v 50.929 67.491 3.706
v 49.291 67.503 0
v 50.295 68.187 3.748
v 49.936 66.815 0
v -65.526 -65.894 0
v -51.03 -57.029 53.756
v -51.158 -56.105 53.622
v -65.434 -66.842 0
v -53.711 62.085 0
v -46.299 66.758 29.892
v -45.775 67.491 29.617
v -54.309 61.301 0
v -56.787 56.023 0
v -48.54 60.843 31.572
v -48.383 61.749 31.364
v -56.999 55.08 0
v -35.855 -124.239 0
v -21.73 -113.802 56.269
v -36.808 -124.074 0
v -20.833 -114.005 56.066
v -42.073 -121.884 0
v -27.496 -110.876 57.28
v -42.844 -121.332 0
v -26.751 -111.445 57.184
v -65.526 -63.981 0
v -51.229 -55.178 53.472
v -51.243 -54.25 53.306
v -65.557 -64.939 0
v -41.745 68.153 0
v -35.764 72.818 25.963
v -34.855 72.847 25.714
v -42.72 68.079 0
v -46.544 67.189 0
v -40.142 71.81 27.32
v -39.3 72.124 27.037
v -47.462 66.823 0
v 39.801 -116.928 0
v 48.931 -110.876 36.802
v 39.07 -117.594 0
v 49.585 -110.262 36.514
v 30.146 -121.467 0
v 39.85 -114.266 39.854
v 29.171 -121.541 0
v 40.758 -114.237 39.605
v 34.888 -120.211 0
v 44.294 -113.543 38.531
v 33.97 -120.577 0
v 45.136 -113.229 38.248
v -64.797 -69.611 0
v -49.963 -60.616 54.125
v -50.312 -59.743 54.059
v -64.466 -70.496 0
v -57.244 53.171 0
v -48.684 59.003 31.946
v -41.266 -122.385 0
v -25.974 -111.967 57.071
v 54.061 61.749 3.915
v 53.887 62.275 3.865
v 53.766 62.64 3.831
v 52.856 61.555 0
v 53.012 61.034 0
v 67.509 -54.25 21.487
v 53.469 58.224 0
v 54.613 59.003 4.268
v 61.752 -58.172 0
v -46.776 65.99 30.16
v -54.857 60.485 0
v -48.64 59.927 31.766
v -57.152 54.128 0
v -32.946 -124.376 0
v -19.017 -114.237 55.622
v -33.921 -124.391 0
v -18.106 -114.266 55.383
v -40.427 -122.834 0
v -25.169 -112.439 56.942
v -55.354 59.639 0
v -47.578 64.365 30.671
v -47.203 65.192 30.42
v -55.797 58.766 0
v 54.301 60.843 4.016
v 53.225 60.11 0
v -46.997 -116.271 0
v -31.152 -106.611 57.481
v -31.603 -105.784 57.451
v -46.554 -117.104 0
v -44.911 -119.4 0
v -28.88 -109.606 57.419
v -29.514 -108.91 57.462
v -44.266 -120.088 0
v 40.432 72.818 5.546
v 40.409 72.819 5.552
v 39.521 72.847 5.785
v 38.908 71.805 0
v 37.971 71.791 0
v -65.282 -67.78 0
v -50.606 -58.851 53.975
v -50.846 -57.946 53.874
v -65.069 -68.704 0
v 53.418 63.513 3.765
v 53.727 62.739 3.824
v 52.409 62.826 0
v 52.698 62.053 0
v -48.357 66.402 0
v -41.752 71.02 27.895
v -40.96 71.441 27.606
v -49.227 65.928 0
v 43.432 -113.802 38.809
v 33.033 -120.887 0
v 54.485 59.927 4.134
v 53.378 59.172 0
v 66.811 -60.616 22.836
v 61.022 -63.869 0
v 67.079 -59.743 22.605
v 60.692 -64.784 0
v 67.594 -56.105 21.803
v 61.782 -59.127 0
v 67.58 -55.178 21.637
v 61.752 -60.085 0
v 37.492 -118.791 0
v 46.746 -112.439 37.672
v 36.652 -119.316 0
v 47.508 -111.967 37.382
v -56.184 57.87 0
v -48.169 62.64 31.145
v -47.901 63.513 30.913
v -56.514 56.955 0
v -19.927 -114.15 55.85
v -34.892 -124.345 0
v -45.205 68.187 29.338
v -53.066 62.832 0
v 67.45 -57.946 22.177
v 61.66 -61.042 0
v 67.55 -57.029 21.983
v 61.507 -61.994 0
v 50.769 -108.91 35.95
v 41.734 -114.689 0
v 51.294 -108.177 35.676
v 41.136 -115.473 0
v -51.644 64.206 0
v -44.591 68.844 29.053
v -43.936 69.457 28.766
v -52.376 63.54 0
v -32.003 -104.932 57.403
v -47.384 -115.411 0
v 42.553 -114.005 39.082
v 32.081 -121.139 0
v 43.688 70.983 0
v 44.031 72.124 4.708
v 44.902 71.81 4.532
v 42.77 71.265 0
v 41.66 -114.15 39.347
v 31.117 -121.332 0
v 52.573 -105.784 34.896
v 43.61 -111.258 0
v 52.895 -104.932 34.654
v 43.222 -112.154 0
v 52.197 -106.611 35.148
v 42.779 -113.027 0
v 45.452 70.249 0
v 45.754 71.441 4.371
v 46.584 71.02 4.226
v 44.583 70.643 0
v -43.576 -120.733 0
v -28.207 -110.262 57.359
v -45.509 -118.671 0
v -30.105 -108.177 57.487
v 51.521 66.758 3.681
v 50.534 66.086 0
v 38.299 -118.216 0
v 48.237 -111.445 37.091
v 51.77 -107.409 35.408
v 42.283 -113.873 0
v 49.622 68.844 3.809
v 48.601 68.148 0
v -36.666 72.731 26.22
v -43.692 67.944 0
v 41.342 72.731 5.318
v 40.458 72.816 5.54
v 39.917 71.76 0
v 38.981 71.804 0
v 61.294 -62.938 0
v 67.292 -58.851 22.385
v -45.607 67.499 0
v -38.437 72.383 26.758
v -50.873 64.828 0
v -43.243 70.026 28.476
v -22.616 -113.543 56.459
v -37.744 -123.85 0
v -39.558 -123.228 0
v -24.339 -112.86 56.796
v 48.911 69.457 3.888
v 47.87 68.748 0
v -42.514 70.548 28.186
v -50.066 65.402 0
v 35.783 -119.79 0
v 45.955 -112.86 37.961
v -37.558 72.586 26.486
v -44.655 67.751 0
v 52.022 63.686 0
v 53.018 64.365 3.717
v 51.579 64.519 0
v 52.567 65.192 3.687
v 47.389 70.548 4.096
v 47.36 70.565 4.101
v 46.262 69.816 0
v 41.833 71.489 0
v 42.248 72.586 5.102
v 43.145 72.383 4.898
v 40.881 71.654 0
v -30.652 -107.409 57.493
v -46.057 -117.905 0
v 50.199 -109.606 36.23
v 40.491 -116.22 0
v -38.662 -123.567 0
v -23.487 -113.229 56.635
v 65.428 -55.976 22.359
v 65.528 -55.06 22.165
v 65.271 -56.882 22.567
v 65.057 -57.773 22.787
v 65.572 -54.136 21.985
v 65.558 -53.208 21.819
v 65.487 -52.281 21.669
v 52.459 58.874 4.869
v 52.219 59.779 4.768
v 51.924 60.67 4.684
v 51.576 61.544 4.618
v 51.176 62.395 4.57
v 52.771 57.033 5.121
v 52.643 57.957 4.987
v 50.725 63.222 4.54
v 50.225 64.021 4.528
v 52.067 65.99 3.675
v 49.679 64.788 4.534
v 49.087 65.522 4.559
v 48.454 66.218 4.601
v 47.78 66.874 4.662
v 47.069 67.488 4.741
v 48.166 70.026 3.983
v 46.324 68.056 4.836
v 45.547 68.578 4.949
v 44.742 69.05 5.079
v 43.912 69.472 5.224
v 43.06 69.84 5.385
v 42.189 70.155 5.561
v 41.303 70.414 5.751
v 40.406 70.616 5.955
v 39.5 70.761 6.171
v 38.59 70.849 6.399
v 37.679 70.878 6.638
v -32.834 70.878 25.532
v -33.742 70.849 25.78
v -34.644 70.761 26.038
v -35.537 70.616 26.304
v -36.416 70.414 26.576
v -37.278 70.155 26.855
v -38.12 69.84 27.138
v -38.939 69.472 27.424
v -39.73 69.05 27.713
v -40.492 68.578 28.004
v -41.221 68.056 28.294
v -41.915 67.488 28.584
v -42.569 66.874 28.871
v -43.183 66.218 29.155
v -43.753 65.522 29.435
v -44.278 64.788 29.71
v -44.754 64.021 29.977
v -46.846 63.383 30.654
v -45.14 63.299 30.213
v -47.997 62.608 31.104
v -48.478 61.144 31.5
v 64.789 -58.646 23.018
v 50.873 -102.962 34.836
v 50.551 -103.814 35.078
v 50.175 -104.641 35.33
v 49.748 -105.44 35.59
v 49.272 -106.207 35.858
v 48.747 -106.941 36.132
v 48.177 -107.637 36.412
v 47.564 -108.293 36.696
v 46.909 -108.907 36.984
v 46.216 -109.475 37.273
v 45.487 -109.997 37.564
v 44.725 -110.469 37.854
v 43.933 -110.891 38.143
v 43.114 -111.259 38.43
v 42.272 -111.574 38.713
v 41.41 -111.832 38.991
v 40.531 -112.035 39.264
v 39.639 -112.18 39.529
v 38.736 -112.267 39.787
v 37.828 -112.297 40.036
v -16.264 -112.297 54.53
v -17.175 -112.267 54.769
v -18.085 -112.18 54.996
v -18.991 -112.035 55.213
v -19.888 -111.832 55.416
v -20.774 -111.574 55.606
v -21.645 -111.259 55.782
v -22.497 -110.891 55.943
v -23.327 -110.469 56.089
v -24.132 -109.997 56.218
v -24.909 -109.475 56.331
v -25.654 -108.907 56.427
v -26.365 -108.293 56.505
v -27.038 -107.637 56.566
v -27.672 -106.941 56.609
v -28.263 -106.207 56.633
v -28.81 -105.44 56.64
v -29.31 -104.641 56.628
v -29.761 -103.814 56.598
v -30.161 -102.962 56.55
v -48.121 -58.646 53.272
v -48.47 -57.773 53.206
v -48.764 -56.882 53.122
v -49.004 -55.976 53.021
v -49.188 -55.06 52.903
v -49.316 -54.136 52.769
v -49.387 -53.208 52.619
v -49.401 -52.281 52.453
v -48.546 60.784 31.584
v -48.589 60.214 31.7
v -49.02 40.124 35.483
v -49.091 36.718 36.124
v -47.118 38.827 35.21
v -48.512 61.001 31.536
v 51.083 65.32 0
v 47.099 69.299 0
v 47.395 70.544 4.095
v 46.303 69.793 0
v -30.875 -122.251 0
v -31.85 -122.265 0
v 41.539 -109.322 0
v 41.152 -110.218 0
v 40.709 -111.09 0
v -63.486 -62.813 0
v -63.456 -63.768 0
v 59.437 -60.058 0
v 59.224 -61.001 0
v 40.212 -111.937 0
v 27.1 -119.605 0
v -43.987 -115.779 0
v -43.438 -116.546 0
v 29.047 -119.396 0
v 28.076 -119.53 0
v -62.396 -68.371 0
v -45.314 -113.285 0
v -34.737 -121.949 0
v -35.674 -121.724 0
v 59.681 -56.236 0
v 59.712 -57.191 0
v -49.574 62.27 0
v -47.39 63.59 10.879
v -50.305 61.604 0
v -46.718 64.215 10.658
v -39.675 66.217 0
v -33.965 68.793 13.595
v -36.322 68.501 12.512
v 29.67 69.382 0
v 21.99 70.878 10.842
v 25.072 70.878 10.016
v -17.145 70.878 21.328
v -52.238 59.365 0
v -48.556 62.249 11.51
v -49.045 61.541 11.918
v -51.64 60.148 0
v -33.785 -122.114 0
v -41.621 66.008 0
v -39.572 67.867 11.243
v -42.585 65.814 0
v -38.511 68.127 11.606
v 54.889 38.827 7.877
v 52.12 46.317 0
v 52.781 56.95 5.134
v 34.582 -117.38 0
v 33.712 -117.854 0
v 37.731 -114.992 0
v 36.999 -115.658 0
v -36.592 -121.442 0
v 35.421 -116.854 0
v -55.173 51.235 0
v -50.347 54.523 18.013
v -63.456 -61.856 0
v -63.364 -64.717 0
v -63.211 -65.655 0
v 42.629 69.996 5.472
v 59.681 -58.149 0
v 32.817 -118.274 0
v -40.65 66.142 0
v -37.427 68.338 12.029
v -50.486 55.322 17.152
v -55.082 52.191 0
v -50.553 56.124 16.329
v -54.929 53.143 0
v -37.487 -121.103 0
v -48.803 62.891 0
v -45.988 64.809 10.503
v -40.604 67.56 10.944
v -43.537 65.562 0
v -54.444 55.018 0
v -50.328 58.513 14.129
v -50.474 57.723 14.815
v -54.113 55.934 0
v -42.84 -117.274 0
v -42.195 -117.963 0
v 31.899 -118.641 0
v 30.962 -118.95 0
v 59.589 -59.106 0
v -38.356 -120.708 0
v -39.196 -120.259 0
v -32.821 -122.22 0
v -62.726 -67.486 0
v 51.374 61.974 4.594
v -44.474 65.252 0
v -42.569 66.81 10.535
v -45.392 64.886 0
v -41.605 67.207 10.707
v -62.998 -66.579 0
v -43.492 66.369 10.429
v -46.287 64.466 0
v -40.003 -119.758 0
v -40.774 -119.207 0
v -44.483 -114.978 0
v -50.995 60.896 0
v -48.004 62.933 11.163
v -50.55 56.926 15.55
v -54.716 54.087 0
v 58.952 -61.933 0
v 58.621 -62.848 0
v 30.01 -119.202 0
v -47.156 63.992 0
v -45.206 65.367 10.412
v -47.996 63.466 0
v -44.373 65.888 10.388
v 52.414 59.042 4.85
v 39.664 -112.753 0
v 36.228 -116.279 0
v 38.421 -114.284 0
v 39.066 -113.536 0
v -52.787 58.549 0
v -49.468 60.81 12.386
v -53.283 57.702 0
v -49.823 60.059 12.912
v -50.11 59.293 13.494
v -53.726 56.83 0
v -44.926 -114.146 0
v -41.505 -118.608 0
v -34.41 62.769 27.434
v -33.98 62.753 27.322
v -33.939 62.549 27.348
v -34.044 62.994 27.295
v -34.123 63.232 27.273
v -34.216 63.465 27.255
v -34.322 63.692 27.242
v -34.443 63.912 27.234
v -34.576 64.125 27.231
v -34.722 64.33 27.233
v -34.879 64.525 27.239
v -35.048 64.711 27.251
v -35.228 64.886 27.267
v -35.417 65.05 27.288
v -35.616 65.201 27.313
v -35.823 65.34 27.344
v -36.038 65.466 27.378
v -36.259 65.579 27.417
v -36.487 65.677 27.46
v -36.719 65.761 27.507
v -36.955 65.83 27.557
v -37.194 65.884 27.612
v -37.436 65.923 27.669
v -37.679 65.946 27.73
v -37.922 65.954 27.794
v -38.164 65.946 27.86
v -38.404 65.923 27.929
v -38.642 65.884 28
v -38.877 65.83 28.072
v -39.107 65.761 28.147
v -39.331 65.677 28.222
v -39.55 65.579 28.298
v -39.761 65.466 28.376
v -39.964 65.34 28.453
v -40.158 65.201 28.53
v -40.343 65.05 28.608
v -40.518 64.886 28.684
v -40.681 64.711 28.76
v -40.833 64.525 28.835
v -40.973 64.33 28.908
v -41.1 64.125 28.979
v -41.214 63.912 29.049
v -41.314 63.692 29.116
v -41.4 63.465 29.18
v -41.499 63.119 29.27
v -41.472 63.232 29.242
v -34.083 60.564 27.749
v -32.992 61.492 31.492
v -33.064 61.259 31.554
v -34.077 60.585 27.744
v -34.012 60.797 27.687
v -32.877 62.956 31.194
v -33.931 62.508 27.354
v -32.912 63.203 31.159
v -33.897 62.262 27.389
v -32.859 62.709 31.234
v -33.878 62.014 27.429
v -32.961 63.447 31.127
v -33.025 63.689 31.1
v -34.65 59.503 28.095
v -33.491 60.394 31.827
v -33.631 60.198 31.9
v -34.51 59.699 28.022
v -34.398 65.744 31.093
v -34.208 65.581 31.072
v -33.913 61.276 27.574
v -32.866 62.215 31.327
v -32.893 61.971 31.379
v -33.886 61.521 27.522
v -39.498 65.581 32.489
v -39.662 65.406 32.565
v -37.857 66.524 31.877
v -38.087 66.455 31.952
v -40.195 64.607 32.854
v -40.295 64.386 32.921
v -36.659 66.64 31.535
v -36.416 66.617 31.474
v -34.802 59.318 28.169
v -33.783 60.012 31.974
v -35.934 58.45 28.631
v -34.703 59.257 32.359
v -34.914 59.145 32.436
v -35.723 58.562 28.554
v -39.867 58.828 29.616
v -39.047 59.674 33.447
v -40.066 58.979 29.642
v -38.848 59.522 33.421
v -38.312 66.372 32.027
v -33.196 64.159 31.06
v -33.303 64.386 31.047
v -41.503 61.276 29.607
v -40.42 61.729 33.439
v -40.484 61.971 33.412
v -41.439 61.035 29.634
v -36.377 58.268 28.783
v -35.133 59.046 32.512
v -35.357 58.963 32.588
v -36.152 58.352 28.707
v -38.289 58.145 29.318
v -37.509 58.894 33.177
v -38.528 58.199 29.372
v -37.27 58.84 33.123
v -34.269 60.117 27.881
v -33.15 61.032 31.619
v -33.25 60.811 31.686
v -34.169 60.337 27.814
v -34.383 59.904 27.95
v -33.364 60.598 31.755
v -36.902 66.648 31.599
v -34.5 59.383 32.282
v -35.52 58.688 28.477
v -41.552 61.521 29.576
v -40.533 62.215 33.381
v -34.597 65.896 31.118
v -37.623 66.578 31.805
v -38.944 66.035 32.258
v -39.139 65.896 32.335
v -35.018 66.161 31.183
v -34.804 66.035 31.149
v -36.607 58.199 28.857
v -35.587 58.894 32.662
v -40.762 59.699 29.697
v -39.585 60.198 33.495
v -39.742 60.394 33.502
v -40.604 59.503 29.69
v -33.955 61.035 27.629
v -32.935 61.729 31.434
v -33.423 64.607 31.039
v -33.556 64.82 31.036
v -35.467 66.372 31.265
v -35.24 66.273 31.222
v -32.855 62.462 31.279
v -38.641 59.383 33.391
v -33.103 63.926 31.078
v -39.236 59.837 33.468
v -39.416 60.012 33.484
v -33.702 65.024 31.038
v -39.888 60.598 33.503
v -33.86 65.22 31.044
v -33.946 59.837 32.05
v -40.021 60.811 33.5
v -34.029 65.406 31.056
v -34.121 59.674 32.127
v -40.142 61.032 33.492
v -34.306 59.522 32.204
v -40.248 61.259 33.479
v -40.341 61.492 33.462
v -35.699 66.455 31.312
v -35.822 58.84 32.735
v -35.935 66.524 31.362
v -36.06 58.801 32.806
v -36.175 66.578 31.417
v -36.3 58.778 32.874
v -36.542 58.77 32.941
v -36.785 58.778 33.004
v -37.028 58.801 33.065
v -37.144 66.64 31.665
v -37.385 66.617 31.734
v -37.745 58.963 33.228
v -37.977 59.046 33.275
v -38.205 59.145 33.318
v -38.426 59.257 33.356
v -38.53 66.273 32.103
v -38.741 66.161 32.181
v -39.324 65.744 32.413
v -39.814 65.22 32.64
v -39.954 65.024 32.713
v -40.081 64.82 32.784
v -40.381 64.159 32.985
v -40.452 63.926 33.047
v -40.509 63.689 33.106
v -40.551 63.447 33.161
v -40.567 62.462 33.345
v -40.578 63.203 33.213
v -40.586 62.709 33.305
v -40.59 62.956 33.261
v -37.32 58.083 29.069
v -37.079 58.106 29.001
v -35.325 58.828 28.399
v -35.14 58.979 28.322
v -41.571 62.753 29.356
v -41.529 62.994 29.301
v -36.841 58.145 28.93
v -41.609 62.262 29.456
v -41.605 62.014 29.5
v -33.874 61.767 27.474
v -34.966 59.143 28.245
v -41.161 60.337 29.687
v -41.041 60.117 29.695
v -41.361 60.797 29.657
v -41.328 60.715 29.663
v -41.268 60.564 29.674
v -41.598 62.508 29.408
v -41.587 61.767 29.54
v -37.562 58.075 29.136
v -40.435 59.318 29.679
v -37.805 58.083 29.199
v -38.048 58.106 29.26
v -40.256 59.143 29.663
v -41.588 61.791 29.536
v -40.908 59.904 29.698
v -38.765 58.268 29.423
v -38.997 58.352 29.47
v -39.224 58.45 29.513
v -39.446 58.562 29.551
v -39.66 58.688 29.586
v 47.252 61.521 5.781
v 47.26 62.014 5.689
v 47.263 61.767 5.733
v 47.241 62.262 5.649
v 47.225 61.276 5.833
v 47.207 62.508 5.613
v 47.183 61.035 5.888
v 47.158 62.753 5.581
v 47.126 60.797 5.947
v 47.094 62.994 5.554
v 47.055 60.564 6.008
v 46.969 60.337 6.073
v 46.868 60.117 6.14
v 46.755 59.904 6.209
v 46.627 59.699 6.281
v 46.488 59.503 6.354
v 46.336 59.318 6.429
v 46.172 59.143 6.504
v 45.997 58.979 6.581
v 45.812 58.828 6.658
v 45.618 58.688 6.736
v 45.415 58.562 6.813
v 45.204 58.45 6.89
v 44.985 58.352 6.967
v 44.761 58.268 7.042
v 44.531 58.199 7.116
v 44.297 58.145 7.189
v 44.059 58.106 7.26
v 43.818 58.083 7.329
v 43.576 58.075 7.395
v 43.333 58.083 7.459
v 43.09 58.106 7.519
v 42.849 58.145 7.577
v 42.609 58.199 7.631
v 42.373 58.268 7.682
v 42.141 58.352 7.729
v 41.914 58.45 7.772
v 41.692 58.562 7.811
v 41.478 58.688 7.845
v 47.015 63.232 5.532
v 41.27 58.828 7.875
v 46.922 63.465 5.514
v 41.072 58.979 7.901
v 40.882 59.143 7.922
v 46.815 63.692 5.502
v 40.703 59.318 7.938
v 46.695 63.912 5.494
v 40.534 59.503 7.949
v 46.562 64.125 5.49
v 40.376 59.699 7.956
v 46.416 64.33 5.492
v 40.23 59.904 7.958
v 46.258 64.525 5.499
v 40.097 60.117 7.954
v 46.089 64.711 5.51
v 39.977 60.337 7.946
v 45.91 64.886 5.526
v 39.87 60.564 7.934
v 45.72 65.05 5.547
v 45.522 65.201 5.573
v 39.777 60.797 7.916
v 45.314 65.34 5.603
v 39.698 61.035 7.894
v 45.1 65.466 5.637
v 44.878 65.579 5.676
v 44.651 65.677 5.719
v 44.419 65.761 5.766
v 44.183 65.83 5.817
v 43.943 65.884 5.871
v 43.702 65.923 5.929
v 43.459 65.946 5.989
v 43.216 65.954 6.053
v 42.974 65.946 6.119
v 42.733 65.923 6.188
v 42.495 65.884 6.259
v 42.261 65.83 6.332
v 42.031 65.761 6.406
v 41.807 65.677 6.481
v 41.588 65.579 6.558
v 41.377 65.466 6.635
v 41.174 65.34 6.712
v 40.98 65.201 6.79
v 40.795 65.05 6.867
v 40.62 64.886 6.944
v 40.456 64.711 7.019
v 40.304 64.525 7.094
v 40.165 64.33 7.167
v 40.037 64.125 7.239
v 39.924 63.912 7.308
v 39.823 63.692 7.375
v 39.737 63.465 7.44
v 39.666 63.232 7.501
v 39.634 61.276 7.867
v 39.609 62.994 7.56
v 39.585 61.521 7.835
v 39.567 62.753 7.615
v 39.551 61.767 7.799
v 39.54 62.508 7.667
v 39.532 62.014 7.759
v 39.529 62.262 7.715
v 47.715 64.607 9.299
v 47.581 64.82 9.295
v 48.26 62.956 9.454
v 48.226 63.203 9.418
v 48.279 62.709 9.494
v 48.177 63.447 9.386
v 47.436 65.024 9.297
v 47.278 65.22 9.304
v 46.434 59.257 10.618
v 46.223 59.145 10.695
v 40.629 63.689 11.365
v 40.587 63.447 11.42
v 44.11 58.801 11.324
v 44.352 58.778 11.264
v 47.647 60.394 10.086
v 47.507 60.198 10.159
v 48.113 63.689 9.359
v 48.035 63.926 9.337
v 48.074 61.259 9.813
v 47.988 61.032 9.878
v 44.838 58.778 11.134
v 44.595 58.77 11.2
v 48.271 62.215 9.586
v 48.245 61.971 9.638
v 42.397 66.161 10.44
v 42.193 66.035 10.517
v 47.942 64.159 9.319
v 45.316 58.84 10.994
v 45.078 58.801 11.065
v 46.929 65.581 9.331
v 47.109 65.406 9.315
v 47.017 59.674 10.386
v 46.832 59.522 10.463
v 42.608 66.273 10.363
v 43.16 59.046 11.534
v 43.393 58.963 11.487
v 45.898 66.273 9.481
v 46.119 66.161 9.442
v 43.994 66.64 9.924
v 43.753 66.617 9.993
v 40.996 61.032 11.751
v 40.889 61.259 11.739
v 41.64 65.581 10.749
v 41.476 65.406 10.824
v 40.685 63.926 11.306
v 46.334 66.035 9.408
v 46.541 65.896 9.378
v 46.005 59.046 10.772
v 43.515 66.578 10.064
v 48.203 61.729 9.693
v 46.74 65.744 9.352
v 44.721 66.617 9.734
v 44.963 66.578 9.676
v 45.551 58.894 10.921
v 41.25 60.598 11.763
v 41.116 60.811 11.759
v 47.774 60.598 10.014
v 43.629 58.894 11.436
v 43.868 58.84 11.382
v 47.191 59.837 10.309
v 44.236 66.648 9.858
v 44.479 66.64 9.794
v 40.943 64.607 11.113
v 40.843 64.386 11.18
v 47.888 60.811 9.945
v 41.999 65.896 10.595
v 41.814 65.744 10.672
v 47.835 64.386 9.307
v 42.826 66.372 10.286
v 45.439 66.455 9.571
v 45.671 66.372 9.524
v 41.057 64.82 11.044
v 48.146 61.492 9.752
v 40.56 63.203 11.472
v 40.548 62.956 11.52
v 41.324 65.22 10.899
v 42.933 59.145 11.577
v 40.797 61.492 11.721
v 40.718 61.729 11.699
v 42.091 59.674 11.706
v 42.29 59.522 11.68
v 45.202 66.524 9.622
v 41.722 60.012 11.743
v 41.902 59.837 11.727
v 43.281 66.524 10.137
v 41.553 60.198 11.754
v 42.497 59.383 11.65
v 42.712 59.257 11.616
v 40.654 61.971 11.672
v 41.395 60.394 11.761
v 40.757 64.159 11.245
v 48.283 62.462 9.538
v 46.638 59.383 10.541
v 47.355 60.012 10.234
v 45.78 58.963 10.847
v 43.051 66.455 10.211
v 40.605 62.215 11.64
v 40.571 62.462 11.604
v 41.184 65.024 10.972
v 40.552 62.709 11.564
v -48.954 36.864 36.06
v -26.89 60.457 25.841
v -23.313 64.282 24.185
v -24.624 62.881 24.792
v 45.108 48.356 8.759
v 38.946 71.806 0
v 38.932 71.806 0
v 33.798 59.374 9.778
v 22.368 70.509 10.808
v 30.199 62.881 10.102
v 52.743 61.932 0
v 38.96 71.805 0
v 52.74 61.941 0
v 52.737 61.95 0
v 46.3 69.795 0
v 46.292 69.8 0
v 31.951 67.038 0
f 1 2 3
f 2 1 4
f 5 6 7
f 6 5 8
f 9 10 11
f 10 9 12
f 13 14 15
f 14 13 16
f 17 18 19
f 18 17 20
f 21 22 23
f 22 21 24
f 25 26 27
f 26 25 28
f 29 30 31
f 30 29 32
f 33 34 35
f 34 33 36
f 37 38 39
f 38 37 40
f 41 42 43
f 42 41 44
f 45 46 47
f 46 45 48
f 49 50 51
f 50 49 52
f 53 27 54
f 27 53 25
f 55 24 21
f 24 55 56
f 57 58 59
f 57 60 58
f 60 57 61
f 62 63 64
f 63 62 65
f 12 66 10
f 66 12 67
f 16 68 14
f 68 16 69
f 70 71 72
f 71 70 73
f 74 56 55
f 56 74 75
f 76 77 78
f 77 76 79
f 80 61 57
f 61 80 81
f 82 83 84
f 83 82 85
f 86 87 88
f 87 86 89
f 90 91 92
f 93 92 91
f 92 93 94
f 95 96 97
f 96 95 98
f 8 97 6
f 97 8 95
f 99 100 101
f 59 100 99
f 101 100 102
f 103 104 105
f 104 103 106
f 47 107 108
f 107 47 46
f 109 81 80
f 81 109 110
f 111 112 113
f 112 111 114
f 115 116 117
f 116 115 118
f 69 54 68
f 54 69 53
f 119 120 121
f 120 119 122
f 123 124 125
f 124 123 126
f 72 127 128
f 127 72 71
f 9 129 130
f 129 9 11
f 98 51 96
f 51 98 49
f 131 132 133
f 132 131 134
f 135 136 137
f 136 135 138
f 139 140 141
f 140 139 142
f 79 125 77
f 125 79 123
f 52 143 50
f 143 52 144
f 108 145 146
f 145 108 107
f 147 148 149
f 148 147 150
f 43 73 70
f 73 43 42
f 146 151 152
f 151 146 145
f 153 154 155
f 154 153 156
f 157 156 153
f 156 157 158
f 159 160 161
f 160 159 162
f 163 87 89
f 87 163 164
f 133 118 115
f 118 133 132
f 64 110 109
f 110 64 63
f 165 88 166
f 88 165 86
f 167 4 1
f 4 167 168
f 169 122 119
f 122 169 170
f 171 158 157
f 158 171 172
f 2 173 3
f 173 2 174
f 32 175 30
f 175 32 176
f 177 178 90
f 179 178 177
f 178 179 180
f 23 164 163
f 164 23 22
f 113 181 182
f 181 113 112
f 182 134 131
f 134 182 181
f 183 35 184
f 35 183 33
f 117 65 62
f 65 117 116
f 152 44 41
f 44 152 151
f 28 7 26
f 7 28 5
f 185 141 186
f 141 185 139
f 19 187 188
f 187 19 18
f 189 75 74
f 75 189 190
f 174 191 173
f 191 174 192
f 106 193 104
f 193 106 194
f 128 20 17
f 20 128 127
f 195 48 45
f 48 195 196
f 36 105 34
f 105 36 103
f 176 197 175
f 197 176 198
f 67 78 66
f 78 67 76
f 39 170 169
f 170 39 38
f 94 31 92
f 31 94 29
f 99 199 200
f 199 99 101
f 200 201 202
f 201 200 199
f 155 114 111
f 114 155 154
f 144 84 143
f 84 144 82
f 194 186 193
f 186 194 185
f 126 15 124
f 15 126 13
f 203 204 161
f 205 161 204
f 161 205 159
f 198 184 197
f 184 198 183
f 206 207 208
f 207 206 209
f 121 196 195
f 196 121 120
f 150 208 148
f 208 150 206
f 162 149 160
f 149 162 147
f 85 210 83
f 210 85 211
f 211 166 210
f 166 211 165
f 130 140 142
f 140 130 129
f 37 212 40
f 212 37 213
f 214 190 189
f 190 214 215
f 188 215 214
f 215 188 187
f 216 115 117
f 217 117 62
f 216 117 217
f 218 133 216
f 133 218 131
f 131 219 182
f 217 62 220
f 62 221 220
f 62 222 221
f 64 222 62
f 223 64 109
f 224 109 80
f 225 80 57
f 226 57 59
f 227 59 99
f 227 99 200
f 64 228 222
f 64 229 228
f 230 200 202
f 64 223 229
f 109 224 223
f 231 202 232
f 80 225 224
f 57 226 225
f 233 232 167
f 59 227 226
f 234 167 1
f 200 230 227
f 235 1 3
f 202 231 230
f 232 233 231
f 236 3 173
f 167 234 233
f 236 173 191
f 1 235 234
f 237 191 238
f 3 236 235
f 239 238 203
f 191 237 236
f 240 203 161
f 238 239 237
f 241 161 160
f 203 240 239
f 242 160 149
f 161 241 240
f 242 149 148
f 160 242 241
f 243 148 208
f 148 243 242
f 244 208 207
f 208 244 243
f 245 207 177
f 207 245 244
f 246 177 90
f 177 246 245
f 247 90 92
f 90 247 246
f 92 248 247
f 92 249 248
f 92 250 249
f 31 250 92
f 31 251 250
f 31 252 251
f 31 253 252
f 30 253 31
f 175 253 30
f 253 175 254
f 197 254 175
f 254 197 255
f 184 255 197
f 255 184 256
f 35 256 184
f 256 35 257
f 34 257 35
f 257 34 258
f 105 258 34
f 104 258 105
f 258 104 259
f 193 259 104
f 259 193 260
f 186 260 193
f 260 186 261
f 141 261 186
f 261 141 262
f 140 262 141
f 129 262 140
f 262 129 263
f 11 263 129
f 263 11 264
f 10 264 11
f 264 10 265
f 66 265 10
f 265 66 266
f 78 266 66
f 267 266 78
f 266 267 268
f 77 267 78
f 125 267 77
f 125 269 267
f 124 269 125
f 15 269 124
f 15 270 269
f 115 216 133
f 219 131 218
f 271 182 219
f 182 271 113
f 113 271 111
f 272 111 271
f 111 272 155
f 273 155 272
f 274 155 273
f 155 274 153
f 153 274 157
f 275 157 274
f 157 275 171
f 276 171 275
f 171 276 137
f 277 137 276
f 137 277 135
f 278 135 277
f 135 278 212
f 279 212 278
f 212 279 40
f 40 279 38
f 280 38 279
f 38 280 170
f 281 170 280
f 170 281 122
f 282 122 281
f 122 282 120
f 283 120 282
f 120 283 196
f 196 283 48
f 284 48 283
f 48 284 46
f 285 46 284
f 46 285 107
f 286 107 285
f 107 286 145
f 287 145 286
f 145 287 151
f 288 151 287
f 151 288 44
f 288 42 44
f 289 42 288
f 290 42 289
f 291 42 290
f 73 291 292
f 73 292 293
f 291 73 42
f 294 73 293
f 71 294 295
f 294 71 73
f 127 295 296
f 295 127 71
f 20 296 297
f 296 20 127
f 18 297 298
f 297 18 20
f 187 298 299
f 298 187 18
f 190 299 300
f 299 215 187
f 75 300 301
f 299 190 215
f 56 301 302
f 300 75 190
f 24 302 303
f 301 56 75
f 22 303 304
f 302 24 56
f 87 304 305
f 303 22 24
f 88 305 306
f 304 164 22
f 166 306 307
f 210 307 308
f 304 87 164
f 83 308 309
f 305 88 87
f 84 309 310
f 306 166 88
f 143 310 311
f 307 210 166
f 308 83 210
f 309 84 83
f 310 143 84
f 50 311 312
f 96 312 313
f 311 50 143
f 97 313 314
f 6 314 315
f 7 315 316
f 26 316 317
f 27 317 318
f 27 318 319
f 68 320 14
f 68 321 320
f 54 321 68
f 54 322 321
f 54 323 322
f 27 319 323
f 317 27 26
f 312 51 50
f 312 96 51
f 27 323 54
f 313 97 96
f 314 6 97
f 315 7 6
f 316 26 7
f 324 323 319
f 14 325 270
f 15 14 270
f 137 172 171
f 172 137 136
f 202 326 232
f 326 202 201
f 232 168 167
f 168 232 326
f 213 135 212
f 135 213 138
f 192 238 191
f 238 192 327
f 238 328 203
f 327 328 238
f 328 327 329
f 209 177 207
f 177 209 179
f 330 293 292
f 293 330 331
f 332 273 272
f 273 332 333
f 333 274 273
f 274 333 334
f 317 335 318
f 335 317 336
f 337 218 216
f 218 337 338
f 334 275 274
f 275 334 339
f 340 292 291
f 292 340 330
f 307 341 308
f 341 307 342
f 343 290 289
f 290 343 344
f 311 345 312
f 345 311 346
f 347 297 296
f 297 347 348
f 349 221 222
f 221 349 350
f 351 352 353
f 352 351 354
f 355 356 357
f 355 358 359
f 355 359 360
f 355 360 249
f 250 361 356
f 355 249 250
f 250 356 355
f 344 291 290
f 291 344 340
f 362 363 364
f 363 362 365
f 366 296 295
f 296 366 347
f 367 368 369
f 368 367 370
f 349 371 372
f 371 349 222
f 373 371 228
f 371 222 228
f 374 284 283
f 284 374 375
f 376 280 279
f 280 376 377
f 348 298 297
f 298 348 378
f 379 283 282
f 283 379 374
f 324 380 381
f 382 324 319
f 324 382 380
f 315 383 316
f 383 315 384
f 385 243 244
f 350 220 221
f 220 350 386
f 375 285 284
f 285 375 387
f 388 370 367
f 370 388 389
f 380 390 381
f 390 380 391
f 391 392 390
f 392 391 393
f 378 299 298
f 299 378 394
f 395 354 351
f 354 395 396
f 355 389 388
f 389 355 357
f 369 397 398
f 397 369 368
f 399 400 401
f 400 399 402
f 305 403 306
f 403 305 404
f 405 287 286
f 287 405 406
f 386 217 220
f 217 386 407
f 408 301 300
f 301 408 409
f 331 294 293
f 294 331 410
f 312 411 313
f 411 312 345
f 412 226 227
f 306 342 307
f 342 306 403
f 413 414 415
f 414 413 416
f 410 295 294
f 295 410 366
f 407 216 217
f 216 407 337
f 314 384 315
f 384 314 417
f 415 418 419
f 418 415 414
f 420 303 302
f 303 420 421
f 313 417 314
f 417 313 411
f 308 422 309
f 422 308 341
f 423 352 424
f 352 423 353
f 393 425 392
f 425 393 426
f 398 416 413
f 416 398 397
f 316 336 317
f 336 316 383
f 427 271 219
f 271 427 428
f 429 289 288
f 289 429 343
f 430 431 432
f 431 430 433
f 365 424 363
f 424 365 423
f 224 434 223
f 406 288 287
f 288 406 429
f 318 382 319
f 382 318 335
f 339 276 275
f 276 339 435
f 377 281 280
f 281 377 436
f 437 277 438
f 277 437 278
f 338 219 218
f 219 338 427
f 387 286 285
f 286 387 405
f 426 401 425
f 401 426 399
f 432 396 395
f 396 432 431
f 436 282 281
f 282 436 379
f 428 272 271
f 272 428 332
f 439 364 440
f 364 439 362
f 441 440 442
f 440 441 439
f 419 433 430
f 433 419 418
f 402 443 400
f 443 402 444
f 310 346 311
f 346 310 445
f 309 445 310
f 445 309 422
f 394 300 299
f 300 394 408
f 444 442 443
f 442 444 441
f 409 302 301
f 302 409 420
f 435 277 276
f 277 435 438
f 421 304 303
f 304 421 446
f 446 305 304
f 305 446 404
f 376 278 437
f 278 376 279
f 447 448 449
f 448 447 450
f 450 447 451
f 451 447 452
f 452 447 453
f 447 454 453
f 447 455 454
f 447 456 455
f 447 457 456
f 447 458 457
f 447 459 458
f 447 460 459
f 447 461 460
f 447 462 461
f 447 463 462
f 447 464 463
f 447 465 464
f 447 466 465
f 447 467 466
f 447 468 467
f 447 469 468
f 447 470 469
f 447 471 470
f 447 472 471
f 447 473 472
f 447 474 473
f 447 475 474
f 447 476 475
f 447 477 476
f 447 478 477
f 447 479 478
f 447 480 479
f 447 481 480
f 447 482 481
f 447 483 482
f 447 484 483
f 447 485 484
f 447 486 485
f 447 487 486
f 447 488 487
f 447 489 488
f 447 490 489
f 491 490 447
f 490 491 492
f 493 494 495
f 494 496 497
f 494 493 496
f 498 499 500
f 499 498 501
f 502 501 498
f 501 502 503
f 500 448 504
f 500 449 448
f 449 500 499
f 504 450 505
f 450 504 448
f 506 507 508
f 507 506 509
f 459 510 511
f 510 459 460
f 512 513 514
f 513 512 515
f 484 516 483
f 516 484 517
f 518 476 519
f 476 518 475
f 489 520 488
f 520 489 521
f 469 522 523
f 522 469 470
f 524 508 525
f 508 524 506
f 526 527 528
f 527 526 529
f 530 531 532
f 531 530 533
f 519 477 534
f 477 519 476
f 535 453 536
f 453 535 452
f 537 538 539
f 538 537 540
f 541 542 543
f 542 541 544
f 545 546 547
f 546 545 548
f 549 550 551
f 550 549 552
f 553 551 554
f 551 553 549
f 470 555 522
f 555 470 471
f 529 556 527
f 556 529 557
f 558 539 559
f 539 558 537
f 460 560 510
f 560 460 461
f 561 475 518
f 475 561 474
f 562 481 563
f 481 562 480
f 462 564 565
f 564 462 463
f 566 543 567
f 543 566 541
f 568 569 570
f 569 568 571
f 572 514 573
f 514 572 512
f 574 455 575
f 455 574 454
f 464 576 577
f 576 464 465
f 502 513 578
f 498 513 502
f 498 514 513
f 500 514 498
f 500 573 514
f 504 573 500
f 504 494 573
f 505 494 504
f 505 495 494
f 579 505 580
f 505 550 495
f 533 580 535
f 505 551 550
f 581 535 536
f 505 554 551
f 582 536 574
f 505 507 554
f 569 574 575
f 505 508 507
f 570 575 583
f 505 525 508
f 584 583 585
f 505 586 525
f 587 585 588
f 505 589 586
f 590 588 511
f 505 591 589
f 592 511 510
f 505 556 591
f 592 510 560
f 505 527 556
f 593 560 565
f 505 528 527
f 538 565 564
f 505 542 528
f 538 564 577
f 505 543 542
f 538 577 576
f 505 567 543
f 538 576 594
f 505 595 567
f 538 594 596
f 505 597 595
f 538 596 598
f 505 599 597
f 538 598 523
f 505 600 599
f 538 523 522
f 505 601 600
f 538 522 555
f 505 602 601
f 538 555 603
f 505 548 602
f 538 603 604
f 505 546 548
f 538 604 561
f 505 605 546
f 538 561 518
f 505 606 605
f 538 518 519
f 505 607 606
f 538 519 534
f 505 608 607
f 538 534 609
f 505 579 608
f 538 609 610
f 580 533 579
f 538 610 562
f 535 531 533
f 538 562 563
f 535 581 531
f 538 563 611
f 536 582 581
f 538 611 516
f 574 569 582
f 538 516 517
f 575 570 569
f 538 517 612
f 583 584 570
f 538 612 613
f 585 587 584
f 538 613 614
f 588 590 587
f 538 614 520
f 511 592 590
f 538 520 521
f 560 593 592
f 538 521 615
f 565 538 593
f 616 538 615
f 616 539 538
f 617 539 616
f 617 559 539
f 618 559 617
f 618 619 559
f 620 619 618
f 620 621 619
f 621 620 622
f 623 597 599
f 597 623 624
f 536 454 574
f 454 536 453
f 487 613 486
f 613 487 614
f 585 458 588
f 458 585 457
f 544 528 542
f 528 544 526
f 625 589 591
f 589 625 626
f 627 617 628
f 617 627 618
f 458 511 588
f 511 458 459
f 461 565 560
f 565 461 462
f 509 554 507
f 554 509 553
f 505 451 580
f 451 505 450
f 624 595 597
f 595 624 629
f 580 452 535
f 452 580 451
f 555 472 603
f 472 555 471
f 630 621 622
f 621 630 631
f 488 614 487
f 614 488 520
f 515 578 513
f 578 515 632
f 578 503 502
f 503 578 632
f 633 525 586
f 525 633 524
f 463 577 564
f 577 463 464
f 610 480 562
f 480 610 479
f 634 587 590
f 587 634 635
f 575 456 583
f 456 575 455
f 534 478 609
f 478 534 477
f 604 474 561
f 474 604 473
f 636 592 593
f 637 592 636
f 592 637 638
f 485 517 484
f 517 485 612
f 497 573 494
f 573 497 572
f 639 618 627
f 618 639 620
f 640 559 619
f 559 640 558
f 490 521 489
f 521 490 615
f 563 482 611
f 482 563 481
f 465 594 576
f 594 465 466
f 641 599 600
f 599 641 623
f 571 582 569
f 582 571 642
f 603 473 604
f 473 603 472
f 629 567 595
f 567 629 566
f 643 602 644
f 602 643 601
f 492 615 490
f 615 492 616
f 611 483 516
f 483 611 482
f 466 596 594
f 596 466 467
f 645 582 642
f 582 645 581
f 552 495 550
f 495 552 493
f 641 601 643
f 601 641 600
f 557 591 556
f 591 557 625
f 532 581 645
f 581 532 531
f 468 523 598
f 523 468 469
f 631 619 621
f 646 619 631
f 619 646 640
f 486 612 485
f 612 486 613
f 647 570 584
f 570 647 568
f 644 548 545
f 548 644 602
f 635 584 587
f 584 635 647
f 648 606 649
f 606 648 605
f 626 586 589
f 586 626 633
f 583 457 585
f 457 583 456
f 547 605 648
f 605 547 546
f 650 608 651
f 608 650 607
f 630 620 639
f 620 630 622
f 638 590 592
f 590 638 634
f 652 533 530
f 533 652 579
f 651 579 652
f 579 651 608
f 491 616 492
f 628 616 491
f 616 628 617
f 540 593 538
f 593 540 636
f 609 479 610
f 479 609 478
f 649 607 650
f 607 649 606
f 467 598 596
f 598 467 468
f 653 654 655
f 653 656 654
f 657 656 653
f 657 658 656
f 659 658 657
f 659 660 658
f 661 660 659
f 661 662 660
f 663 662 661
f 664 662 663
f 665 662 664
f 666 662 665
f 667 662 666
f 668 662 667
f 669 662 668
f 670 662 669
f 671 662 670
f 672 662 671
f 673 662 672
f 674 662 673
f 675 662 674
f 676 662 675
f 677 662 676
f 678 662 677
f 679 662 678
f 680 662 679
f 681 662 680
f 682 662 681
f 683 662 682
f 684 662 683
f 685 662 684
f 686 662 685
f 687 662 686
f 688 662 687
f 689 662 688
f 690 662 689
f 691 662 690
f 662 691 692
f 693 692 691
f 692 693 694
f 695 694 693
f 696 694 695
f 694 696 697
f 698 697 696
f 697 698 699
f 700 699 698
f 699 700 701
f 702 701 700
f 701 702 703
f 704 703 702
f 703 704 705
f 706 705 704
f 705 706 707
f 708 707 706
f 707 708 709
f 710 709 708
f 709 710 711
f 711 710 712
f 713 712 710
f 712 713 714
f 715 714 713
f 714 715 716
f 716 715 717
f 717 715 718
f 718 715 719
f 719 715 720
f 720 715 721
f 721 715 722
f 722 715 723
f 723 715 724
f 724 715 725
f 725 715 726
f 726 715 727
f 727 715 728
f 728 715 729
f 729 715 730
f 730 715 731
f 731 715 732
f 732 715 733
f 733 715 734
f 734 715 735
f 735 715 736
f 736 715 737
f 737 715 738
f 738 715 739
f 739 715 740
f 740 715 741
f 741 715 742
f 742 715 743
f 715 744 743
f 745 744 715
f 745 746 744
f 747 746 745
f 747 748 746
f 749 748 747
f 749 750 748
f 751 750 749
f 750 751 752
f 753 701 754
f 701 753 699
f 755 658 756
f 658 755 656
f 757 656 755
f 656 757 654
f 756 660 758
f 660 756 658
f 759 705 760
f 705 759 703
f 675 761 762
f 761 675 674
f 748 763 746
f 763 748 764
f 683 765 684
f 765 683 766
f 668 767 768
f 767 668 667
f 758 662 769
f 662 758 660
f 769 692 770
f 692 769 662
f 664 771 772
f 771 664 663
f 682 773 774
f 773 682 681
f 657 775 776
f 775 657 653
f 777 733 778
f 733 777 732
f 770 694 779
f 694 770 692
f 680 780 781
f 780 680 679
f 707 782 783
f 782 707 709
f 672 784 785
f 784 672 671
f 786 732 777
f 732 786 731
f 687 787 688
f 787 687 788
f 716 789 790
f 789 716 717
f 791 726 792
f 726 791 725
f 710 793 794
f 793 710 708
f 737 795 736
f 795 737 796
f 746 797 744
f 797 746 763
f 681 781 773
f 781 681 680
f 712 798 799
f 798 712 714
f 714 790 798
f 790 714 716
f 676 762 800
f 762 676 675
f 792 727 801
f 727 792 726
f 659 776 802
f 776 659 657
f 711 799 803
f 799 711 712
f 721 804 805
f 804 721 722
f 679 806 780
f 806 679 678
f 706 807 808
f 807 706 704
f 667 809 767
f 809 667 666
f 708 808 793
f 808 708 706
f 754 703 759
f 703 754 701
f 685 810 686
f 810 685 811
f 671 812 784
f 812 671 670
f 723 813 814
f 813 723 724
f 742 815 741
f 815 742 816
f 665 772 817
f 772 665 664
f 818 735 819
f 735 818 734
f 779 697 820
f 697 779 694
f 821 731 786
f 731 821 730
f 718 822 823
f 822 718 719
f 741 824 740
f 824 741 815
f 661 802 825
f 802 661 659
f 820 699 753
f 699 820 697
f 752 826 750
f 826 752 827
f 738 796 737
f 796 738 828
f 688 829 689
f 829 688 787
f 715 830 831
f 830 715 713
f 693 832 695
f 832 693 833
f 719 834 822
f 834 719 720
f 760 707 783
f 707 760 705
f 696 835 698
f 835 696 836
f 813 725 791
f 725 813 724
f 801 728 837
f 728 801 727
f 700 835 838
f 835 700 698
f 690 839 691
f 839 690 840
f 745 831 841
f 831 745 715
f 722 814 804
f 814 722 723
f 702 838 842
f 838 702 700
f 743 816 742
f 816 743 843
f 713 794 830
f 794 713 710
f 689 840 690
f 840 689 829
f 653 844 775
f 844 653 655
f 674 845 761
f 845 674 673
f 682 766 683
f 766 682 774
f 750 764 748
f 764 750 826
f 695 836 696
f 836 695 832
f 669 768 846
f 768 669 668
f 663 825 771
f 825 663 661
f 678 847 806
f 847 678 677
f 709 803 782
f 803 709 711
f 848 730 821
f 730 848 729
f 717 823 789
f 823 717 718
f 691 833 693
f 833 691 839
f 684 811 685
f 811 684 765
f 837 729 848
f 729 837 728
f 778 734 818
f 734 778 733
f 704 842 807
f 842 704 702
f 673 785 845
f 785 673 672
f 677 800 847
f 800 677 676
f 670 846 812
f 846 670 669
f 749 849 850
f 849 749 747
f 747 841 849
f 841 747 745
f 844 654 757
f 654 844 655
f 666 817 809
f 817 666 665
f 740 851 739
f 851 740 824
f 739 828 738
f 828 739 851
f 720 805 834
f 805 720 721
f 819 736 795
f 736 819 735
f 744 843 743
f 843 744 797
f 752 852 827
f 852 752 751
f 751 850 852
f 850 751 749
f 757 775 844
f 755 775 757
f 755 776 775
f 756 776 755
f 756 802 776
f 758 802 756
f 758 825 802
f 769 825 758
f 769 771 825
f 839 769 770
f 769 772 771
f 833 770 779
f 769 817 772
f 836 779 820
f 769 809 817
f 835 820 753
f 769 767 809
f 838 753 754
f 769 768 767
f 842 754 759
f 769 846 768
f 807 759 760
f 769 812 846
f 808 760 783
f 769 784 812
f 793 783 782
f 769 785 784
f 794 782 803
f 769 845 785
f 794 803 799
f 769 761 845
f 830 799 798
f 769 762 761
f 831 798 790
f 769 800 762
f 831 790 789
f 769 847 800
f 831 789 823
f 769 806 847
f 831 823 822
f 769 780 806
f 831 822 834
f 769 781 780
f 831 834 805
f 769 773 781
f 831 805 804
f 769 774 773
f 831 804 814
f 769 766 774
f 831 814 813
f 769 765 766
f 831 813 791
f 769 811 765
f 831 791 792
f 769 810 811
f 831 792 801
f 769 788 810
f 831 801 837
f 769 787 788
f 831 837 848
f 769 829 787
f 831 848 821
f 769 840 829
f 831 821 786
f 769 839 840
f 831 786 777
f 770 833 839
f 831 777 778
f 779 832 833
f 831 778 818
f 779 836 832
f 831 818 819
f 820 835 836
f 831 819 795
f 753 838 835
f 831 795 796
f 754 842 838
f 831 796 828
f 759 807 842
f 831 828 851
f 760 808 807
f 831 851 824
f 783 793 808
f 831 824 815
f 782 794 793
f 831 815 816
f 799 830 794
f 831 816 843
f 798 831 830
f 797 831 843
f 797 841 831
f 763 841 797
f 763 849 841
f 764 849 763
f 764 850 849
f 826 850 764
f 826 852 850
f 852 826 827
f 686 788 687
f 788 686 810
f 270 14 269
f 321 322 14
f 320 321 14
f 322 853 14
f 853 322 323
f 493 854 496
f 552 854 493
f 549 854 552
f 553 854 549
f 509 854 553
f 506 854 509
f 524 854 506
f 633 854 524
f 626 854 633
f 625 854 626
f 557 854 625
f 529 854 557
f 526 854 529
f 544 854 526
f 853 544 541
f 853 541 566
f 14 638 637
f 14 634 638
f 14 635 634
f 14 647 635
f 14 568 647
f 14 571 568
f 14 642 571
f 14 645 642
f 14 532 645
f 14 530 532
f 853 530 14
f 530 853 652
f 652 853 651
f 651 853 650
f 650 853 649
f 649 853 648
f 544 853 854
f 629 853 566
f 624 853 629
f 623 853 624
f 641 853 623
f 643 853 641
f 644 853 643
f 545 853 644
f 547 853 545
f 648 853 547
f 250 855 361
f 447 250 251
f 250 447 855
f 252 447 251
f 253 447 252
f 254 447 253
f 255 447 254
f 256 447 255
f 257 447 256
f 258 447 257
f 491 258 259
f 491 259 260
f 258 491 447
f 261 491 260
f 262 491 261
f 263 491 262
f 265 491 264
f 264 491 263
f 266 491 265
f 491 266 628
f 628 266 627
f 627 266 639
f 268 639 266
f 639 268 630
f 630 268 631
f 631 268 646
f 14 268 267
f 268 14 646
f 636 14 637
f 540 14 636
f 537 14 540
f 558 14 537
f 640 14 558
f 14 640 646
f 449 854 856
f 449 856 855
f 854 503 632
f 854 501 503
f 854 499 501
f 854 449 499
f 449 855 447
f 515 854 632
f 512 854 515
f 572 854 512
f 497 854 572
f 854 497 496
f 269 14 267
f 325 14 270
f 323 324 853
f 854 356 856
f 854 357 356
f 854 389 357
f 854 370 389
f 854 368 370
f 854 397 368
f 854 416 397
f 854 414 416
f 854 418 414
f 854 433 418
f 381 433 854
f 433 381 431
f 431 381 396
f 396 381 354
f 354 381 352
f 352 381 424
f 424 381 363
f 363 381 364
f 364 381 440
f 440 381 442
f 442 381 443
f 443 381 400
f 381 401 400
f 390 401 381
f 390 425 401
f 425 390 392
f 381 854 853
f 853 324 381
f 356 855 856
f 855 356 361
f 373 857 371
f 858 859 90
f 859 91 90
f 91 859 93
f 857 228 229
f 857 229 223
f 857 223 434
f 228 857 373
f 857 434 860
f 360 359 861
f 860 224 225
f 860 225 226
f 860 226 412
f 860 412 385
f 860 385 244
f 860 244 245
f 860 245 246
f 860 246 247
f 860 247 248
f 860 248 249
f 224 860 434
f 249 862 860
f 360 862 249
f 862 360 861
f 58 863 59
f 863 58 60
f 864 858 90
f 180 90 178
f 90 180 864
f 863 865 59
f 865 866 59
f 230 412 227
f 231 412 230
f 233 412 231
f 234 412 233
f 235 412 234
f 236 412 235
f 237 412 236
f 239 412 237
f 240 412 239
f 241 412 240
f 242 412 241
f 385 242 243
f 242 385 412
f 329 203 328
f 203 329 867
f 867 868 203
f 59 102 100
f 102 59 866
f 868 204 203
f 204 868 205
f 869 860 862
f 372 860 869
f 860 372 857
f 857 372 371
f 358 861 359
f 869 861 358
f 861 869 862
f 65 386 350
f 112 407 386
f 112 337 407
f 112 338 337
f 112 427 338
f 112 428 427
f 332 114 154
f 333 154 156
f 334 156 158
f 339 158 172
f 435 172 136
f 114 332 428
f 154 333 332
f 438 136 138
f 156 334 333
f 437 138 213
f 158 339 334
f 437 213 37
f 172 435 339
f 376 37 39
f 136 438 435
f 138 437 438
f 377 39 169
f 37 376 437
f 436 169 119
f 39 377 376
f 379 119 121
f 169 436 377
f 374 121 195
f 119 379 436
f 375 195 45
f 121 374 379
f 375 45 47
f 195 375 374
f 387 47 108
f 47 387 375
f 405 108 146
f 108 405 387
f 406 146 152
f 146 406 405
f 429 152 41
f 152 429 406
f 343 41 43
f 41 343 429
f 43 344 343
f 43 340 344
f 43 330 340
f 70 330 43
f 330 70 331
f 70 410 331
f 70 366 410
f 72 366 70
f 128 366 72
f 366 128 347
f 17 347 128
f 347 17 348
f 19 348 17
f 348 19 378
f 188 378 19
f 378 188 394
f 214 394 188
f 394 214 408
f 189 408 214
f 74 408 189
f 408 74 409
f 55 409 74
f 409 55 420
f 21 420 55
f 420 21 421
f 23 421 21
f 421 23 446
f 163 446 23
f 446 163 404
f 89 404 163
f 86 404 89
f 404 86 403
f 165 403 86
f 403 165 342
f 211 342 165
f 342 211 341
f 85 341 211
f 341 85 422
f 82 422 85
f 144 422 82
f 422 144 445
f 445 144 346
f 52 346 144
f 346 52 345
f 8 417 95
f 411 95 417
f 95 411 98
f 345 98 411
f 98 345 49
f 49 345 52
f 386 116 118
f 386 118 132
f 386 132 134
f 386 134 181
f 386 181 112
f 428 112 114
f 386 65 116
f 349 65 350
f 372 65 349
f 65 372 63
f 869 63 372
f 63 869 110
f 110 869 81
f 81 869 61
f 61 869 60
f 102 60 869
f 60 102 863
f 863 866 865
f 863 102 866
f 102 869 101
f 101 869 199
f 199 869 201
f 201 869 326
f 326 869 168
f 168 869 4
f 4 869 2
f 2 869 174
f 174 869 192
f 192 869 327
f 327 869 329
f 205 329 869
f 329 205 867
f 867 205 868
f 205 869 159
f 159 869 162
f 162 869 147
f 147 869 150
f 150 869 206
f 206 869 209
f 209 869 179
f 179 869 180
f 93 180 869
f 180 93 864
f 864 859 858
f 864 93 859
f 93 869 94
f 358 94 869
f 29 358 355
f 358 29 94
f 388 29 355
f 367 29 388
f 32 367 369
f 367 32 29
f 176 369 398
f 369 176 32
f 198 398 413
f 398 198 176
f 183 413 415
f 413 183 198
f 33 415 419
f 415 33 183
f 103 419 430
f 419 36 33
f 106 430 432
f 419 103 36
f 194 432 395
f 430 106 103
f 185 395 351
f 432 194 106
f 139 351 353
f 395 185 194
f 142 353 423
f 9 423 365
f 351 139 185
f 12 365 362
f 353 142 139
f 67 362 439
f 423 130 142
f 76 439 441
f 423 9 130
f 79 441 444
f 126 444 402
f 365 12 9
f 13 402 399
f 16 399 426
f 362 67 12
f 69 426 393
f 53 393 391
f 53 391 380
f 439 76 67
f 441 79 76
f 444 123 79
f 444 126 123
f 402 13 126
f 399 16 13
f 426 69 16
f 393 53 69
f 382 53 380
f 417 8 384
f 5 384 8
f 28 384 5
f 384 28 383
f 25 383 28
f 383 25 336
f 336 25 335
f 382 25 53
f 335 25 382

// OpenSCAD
// Whether or not to include support for wrist rest
wrist_rest=true;

// The side-to-side angle of the spacer
roll_angle=15; // [-40:40]

// The back/forth angle of the spacer
pitch_angle=-10; // [-30:0]

// Height of lowest point from the surface
base_height=2; // [0:20]

// Wall thickness
wall_thickness=2; // [0.5:10]

// ------------------------------------
/* [Constants (don't touch these)] */
front_w=107;
front_hole_cc=84;
back_w=123;
base_len=145;
platform_h=200;
corner_radius=15;
pin_diameter=8;

wrist_rest_front_w=110;
wrist_rest_back_w=90;
wrist_rest_len=90;

$fn = 100;

module rotate_about_pt(x, y, z, pt) {
	translate(pt)
		rotate([x, y, z])
			translate(-pt)
				children();
}

module shape(front_width, back_width, length, height, corner_rad, shrink_offset=0) {
	minkowski() {
		offs=corner_rad+shrink_offset;
		front_left=[-(front_width/2)+offs, (length/2)-offs];
		front_right=[(front_width/2)-offs, (length/2)-offs];
		back_right=[(back_width/2)-offs, -(length/2)+offs];
		back_left=[-(back_width/2)+offs, -(length/2)+offs];

		back_right_rest=[(wrist_rest_back_w/2)-offs, -(length/2)-(wrist_rest_len/2)+offs];
		back_left_rest=[-(wrist_rest_back_w/2)+offs, -(length/2)-(wrist_rest_len/2)+offs];

		linear_extrude(height, center=true)
			polygon(wrist_rest ? [
				front_left,
				front_right,
				back_right,
				back_right_rest,
				back_left_rest,
				back_left,
			] : [
				front_left,
				front_right,
				back_right,
				back_left,
			]);
		cylinder(height, r=corner_rad, center=true);
	}
}

module hollow_shape() {
	difference() {
		shape(front_w, back_w, base_len, platform_h, corner_radius);
		translate([0, 0, -0.1])
			shape(
				front_w,
				back_w,
				base_len,
				platform_h+10,
				corner_radius,
				wall_thickness
			);
	}
}

module cut_box() {
	cut_box_w=1000;
	cut_box_l=1000;
	cut_box_h=1000;

	translate([0, 0, -500])
		cube([cut_box_w, cut_box_l, cut_box_h], center=true);
}

module on_top_plane() {
	x_origin=roll_angle < 0 ? -front_w/2 : front_w/2;
	y_origin=base_len/2;

	rotate_about_pt(pitch_angle, roll_angle, 0, [x_origin, y_origin])
		translate([0, 0, -platform_h+base_height])
			children();
}

module model() {
	on_top_plane()
		hollow_shape();
}

module solid_model() {
	on_top_plane()
		shape(front_w, back_w, base_len, platform_h, corner_radius);
}

module cut_pins() {
	intersection() {
		translate([0, 0, 50+platform_h])
			cube([1000, 1000, 100], center=true);

		children();
	}
}

module mount_pins() {
	// left
	cut_pins()
		translate([-front_hole_cc/2, base_len/2-corner_radius+4, 0])
			cylinder(platform_h+4, d=pin_diameter);

	// right
	cut_pins()
		translate([front_hole_cc/2, base_len/2-corner_radius+4, 0])
			cylinder(platform_h+4, d=pin_diameter);
}

module corner_box(left=true) {
	intersection() {
		solid_model();

		on_top_plane()
			translate([left ? -front_hole_cc/2 : front_hole_cc/2, base_len/2, platform_h+50])
				rotate([40, 0, left ? 45 : -45])
					cube([90, 90, 1000], center=true);
	}
}

difference() {
	union() {
		model();
		on_top_plane()
			mount_pins();
		corner_box(true);
		corner_box(false);
	}
	cut_box();
}
